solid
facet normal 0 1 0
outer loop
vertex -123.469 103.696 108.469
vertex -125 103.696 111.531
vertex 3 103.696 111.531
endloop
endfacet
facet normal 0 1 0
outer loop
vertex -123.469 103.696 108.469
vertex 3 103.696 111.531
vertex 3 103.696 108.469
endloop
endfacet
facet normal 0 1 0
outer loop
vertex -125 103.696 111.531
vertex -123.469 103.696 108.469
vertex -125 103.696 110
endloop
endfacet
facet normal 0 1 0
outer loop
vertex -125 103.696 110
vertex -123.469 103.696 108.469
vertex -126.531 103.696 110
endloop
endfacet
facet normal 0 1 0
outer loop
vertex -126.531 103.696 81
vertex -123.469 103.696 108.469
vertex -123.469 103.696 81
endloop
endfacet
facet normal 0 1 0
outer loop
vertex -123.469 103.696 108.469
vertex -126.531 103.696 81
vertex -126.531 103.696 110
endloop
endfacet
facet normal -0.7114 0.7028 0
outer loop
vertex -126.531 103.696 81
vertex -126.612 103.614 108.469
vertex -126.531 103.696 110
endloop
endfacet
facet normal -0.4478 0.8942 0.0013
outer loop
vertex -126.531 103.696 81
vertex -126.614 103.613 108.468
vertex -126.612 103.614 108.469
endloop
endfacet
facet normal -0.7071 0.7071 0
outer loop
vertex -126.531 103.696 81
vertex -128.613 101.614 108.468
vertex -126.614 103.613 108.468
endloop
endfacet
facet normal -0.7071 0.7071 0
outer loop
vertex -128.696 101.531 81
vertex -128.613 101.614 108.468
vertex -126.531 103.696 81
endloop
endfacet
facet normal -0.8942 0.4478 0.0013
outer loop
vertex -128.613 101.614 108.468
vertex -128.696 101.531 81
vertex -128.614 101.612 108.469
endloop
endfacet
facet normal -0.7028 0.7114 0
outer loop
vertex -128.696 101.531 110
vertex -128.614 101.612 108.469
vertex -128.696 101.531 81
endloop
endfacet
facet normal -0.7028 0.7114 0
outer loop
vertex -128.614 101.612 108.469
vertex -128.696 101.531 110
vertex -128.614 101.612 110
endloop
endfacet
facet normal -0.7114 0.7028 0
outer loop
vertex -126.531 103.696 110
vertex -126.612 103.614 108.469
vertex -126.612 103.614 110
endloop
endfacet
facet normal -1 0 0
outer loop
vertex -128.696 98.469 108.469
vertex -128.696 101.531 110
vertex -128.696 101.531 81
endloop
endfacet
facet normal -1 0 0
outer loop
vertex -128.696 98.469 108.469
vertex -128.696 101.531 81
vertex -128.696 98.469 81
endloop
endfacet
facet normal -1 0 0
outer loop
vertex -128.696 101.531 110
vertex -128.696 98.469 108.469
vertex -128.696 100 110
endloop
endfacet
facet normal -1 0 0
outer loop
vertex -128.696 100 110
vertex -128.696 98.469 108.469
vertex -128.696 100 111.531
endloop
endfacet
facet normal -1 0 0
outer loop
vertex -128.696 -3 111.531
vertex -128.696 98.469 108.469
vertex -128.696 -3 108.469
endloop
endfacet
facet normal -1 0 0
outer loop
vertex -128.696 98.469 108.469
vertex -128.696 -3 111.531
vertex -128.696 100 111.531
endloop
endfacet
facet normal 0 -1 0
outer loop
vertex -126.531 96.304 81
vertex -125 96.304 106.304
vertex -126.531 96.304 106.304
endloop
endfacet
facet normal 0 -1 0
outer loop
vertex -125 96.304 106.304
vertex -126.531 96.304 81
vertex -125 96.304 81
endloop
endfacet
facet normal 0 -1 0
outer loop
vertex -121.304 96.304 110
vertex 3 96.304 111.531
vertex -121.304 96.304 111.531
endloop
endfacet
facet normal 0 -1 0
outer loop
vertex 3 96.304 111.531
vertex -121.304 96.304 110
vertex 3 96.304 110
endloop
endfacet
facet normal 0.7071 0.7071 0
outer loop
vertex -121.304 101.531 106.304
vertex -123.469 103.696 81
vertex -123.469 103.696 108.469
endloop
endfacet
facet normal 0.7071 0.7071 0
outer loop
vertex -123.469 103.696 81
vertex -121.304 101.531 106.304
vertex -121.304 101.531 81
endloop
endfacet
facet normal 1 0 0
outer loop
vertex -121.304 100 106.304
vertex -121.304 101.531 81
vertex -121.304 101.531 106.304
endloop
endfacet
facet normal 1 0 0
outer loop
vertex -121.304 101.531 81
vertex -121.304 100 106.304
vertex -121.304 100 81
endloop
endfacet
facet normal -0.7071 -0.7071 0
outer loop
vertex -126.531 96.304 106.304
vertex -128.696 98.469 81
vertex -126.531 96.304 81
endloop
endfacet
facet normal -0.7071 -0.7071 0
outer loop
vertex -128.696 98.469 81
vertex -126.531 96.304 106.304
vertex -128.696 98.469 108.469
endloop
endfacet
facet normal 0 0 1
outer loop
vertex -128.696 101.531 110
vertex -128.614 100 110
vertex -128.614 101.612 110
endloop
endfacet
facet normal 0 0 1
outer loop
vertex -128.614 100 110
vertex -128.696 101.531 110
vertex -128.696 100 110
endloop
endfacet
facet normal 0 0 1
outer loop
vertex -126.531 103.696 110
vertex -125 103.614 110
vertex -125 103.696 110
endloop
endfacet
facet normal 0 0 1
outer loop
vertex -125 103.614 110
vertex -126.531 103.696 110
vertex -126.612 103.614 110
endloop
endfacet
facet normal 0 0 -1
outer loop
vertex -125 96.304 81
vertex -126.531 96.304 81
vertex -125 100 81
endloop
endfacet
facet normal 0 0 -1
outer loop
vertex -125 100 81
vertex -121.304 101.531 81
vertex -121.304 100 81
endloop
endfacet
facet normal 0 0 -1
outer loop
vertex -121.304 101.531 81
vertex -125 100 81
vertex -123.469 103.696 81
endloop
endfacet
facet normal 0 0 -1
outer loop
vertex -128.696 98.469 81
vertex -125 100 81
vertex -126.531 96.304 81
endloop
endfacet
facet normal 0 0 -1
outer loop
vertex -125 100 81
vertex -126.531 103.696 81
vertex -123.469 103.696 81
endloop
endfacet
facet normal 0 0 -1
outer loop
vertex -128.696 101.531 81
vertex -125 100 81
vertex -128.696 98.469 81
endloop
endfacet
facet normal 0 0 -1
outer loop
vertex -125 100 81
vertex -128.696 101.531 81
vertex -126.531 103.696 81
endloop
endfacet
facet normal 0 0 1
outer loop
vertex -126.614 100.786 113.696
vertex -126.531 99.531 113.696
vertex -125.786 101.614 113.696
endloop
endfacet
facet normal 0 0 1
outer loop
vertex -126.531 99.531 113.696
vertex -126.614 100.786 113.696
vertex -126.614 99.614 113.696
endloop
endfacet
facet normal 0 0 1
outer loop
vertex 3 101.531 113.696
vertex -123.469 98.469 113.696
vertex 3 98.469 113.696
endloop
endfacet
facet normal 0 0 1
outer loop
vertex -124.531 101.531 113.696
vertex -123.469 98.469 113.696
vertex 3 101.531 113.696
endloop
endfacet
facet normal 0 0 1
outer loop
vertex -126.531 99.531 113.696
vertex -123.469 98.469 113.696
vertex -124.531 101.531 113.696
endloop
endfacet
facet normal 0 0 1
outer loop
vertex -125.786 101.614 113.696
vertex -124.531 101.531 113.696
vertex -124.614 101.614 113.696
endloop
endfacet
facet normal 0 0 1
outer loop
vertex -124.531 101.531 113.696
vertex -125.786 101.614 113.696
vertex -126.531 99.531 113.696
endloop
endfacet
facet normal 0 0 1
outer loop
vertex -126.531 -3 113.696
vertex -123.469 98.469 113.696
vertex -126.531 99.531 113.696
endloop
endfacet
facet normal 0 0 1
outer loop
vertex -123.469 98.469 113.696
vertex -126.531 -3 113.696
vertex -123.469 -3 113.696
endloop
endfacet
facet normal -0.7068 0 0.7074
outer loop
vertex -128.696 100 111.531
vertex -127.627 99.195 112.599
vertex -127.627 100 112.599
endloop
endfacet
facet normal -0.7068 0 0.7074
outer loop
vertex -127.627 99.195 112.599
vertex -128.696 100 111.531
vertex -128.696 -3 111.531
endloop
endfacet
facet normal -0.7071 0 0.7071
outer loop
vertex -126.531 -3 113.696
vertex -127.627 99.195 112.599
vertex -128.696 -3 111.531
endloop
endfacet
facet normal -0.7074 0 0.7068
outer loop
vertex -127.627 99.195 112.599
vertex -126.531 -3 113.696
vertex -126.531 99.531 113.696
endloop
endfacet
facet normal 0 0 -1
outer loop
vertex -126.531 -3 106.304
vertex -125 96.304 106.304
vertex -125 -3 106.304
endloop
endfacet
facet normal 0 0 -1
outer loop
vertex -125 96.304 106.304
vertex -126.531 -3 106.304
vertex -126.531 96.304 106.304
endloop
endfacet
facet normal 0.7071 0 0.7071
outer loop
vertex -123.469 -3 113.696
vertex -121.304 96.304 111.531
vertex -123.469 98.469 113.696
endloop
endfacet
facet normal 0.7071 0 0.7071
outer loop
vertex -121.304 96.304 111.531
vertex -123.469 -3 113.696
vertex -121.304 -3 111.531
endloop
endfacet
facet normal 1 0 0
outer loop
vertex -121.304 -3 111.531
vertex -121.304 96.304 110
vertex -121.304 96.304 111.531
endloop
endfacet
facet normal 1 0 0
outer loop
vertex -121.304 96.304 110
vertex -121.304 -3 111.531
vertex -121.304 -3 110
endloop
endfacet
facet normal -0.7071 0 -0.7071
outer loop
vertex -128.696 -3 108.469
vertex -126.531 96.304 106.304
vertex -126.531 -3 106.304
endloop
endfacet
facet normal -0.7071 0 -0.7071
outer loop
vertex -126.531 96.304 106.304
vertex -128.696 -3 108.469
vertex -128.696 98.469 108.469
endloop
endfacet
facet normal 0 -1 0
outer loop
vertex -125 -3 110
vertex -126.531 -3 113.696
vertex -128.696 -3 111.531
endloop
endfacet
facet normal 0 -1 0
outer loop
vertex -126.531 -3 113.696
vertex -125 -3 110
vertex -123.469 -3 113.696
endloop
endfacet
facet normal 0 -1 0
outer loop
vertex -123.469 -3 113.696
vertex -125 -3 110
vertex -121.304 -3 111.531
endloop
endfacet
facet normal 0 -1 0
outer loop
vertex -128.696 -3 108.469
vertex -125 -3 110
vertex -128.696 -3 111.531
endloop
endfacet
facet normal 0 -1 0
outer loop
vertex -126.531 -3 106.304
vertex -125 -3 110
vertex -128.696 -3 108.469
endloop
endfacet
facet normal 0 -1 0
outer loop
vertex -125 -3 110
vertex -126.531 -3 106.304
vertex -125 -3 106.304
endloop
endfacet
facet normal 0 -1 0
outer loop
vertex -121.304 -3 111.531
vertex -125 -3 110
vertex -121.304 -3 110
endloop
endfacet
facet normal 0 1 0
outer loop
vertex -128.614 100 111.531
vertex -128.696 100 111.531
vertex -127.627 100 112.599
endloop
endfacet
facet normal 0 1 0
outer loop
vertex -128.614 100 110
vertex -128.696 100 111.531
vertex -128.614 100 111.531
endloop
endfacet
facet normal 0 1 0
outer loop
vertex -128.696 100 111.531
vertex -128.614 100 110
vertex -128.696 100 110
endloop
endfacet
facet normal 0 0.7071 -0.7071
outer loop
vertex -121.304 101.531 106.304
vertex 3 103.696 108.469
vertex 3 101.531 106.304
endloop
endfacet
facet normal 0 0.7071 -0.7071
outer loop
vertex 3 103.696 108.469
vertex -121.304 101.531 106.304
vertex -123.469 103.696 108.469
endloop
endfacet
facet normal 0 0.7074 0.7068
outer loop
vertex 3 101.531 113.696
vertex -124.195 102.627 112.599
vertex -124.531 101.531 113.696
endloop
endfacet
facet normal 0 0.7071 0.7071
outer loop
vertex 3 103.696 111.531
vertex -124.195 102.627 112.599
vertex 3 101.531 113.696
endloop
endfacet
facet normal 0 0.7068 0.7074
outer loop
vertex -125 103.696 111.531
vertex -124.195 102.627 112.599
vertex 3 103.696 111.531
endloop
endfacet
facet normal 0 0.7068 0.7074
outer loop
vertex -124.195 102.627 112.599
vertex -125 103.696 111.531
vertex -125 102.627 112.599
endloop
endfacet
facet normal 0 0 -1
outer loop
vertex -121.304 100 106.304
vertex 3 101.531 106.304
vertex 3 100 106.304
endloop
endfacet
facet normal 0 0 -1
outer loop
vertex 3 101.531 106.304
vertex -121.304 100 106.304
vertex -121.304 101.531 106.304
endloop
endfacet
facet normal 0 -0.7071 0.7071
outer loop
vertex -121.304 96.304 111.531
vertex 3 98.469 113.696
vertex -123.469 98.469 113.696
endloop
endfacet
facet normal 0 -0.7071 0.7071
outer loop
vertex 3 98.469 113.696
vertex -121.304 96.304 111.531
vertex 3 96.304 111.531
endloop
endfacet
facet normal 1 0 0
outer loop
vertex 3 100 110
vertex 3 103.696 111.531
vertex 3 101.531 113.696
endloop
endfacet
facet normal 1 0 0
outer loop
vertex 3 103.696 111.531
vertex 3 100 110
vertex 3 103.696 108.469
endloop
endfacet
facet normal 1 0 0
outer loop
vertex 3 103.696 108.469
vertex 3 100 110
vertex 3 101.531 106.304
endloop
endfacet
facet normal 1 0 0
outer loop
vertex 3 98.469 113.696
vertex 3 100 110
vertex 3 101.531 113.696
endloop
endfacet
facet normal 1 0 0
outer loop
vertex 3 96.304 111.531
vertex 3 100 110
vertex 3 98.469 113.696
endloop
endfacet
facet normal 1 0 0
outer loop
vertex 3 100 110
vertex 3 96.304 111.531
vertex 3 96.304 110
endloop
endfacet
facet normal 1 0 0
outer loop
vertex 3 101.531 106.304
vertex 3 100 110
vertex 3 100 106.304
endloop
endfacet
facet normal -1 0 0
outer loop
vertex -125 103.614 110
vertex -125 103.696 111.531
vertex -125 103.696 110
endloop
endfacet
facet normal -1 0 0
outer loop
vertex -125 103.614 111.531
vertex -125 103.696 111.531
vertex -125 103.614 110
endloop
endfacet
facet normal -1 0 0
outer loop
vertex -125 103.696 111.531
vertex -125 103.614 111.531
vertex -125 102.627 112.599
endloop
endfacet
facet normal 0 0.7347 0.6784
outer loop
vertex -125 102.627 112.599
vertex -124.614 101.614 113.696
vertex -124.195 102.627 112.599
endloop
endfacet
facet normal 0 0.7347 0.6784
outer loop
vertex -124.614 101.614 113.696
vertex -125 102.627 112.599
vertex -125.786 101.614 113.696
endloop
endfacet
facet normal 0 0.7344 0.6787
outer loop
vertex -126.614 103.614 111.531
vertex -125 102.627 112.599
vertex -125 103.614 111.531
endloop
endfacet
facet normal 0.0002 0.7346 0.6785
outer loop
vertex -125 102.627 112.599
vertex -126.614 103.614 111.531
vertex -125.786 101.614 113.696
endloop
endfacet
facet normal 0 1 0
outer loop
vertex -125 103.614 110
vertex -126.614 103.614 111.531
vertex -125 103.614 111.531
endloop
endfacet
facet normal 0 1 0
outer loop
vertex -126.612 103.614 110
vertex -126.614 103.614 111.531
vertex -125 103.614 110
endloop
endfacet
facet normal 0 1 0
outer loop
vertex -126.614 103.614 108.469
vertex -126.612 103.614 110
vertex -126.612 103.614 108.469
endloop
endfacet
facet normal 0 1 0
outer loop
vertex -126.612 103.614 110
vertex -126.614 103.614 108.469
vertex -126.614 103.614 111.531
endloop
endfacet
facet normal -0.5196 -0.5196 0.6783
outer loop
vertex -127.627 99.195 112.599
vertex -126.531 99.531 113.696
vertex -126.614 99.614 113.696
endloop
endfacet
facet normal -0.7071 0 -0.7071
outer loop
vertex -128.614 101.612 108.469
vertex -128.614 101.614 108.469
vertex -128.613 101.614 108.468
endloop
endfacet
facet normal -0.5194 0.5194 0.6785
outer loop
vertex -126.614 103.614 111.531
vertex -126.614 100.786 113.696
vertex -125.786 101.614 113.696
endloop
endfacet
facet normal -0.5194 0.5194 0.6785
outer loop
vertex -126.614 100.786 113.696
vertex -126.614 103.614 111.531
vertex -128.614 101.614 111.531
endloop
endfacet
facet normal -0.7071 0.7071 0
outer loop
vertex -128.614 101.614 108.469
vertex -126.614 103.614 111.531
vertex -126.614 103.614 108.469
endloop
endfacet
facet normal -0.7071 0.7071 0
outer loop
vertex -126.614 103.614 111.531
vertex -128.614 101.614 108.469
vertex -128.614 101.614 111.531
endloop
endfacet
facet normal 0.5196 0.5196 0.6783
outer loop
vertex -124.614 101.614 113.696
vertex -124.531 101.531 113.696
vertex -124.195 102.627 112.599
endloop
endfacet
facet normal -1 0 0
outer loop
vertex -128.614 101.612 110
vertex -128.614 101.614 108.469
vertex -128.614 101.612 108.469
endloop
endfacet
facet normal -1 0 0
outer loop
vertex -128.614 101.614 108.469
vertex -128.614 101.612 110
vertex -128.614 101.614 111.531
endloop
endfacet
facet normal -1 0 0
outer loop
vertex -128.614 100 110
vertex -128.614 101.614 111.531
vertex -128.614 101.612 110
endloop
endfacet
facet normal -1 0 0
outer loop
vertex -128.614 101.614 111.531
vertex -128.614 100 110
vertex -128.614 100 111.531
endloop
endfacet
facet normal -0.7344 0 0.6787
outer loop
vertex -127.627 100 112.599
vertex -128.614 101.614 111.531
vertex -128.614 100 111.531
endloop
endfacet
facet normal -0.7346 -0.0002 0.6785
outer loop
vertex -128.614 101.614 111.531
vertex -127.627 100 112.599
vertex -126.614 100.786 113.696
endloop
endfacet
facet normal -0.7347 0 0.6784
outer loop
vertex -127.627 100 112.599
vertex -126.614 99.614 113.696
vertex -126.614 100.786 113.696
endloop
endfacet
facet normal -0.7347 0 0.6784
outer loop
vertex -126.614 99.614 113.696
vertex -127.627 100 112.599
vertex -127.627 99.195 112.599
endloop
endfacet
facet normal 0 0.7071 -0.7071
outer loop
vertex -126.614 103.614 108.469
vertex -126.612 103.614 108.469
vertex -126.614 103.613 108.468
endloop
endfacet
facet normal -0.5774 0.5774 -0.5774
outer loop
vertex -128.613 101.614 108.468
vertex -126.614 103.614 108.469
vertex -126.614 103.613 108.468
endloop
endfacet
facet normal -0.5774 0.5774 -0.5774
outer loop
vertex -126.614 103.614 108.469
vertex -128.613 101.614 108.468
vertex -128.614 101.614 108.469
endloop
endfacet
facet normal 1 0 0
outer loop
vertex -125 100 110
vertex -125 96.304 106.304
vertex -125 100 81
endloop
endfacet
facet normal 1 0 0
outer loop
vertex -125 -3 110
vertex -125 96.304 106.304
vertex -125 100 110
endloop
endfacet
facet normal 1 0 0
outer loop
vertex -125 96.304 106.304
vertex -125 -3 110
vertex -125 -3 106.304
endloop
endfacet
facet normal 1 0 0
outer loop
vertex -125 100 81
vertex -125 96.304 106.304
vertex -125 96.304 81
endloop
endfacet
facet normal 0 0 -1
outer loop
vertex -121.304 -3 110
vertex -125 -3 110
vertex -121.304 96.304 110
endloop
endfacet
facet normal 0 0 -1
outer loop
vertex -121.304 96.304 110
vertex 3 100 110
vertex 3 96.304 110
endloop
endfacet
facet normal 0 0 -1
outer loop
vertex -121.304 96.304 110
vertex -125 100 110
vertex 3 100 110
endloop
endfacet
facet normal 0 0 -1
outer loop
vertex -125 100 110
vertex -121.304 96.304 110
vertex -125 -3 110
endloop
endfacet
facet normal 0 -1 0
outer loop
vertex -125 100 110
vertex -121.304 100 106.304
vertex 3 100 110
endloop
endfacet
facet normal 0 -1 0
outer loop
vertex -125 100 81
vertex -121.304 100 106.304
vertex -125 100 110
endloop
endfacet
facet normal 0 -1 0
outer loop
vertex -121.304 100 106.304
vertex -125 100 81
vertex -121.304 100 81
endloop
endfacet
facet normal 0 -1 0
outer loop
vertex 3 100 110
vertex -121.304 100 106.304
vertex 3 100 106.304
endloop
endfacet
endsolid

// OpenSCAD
// file: ../Parts/rounder.scad
// rounder.scad
// cutting tool for rounding off corners with a cylinder

//---------------------
module rounder(
r=10,   // radius
h=10,   // height
f=22,    // $fn
extra=0.01  // extra size for the cube
){

difference(){
  translate([-extra,-extra,-extra])
  cube([r+extra,r+extra,h+2*extra]);
  translate([r,r,-1])
  cylinder(r=r,h=h+2,$fn=f);
}

}

//---------------------------------------------------------------------------
module bevel(x=1,y=1,h=10){

linear_extrude(height=h)
polygon(points=[[0,0],[x,0],[0,y]]);
    
}
  

//========================

rounder();

//========================
// main file
//=================================================================================
// BoxLarge.scad
//
// The Big Fairy Crystal storage box.
//
// Dr Tom Flint, 1 Jan 2023
//=================================================================================

use <../Parts/rounder.scad>
use <../Parts/threads.scad>
use <../Gears/gears.scad>
use <../Fractals/Lsystem.scad>


r1=4;   // radius of knob
$fn=8;

//-----------------------------------------------------------------------------------
module top1(){

extra=3.0;

difference(){
  union(){
    translate([125,100, 84-extra])
    rotate([0,0,180/8])
    cylinder(r=r1,h=26+extra);

    translate([125,100, 84+26])
    rotate([90,0,0])
    rotate([0,0,180/8])
    cylinder(r=r1,h=100+extra);

    translate([125,100, 84+26])
    rotate([0,-90,0])
    rotate([0,0,180/8])
    cylinder(r=r1,h=125+extra);

    translate([125.2,100.2, 84+26])
    rotate([0,0,180/8])
    sphere(r=r1);
  }
  boxTop(a=0);
  boxBase();
}
}

//-----------------------------------------------------------------------------------
module base1(){

extra=2.0;
foot=10;

difference(){
  union(){
    translate([125,100, -foot])
    rotate([0,0,180/8])
    cylinder(r=r1,h=84+extra+foot);

    translate([125-13,100-3, -foot]){
      difference(){
        cube([13,4,foot]);
        translate([-2.5,0,-1])
        rotate([90,0,0])
        cylinder(r=10,h=20,center=true,$fn=88);
      }
    }
    
    translate([125-3,100-13, -foot]){
      difference(){
        cube([4,13,foot]);
        translate([0,-2.5,-1])
        rotate([0,90,0])
        cylinder(r=10,h=20,center=true,$fn=88);
      }
    }
    intersection(){
      translate([125-2,100-2, -1.0])
      cylinder(r=11,h=1,$fn=44);
      translate([125-15,100-15, -2.0])
      cube([15,15,3]);
    }
  }

  boxTop(a=0,tol=0);
  boxBase(tol=0);
  base2(tol=0.1);
  base3(tol=0.1);

  translate([125-5,100-4 -1.0])
  cylinder(r=0.7,h=10,center=true);
}



if(0){
  base2();
  base3();
}

}

//-----------------------------------------------------------------------------------
module base2(tol=0){

extra=0.5;
foot=10;
thick=0.9;

  translate([125,100,0])
  rotate([-90,0,0])
  intersection(){
    linear_extrude(height=thick+tol)
    scale([10,10])
    rotate(10)
    offset(tol)
    penrose_tiling(n=4, w=0.3);   // Recommended n <= 6

    translate([-100,-100,-1])
    cube([100,100,2]);
  }

  translate([125-64,100,0])
  cube([64,0.9,3]);  

  translate([125-3,100,0])
  cube([3,0.9,67]);  

  // tab under box
  difference(){
    union(){
      translate([125-66,100-4+0.9, -1.1])
      cube([52.8,4,1.2]);
      translate([63,100-4+0.9, -1.1])
      cylinder(r=4,h=1.2,$fn=88);
    }
    translate([63,100-4+0.9, -1.1])
    cylinder(r=0.7,h=8,center=true,$fn=88);
  }
}

//-----------------------------------------------------------------------------------
module base3(tol=0){

extra=0.5;
foot=10;
thick=0.9;


  translate([125,100,0])
  rotate([0,90,0])
  intersection(){
    linear_extrude(height=thick+tol)
    scale([10,10])
    rotate(10)
    offset(tol)
    penrose_tiling(n=4, w=0.3);   // Recommended n <= 6

    translate([-100,-100,-1])
    cube([100,100,2]);
  }

  translate([125,100-66,0])
  cube([0.9,66,3]);  

  translate([125,100-3,0])
  cube([0.9,3,67.7]);  

  // tab under box
  difference(){
    union(){
      translate([125-4+0.9,100-54-13.2, -1.1])
      cube([4,54,1.2]);
      translate([125-4+0.9,100-54-9.2, -1.1])
      cylinder(r=4,h=1.2,$fn=88);
    }
    translate([125-4+0.9,100-54-9.2, -1.1])
    cylinder(r=0.7,h=8,center=true,$fn=88);
  }
}

//-----------------------------------------------------------------------------------
module boxTop(a=0,tol=0){

translate([-250/2-tol,-200/2-tol,84-tol])
translate([0,-2,0])
rotate([a,0,0])
translate([0,2,0])
cube([250+2*tol,200+2*tol,26+2*tol]);



}

//-----------------------------------------------------------------------------------
module boxBase(tol=0){

translate([0,0,84/2])
cube([250+2*tol,200+2*tol,84+2*tol],center=true);




}

//================================================================================

if(0){
  color("cyan")
  boxTop(a=0);

  color("green")
  boxBase();
}

if(0){
  intersection(){
    translate([250/2-30,200/2-20,100])
    cube([40,40,40]);

    top1();
  }
}

if(0){
  //~ top1();
  //~ base1();
  base2();
  base3();
}


if(1){
  mirror([1,0,0])
  top1();
//  mirror([1,0,0])
//  base1();

//  mirror([1,0,0])
//  base2();
//  mirror([1,0,0])
//  base3();
}

// hinge trim doesn't work because posts are purposefully too long
// cut them down to fit the actual box
if(0){
  difference(){
  rotate([0,0,180]){
    color("gray")
    top1();
    //~ base1();
    //~ base2();
    //~ base3();
    //~ mirror([1,0,0])
    //~ top1();
    //~ mirror([1,0,0])
    //~ base1();
    //~ mirror([1,0,0])
    //~ base2();
    //~ mirror([1,0,0])
    //~ base3();
  }
  // trim for hinge clearance
  translate([-160,-200/2-19,66])
  rotate([45,0,0])
  cube([300,0.707*40,0.707*40]);
}

}

//================================================================================
